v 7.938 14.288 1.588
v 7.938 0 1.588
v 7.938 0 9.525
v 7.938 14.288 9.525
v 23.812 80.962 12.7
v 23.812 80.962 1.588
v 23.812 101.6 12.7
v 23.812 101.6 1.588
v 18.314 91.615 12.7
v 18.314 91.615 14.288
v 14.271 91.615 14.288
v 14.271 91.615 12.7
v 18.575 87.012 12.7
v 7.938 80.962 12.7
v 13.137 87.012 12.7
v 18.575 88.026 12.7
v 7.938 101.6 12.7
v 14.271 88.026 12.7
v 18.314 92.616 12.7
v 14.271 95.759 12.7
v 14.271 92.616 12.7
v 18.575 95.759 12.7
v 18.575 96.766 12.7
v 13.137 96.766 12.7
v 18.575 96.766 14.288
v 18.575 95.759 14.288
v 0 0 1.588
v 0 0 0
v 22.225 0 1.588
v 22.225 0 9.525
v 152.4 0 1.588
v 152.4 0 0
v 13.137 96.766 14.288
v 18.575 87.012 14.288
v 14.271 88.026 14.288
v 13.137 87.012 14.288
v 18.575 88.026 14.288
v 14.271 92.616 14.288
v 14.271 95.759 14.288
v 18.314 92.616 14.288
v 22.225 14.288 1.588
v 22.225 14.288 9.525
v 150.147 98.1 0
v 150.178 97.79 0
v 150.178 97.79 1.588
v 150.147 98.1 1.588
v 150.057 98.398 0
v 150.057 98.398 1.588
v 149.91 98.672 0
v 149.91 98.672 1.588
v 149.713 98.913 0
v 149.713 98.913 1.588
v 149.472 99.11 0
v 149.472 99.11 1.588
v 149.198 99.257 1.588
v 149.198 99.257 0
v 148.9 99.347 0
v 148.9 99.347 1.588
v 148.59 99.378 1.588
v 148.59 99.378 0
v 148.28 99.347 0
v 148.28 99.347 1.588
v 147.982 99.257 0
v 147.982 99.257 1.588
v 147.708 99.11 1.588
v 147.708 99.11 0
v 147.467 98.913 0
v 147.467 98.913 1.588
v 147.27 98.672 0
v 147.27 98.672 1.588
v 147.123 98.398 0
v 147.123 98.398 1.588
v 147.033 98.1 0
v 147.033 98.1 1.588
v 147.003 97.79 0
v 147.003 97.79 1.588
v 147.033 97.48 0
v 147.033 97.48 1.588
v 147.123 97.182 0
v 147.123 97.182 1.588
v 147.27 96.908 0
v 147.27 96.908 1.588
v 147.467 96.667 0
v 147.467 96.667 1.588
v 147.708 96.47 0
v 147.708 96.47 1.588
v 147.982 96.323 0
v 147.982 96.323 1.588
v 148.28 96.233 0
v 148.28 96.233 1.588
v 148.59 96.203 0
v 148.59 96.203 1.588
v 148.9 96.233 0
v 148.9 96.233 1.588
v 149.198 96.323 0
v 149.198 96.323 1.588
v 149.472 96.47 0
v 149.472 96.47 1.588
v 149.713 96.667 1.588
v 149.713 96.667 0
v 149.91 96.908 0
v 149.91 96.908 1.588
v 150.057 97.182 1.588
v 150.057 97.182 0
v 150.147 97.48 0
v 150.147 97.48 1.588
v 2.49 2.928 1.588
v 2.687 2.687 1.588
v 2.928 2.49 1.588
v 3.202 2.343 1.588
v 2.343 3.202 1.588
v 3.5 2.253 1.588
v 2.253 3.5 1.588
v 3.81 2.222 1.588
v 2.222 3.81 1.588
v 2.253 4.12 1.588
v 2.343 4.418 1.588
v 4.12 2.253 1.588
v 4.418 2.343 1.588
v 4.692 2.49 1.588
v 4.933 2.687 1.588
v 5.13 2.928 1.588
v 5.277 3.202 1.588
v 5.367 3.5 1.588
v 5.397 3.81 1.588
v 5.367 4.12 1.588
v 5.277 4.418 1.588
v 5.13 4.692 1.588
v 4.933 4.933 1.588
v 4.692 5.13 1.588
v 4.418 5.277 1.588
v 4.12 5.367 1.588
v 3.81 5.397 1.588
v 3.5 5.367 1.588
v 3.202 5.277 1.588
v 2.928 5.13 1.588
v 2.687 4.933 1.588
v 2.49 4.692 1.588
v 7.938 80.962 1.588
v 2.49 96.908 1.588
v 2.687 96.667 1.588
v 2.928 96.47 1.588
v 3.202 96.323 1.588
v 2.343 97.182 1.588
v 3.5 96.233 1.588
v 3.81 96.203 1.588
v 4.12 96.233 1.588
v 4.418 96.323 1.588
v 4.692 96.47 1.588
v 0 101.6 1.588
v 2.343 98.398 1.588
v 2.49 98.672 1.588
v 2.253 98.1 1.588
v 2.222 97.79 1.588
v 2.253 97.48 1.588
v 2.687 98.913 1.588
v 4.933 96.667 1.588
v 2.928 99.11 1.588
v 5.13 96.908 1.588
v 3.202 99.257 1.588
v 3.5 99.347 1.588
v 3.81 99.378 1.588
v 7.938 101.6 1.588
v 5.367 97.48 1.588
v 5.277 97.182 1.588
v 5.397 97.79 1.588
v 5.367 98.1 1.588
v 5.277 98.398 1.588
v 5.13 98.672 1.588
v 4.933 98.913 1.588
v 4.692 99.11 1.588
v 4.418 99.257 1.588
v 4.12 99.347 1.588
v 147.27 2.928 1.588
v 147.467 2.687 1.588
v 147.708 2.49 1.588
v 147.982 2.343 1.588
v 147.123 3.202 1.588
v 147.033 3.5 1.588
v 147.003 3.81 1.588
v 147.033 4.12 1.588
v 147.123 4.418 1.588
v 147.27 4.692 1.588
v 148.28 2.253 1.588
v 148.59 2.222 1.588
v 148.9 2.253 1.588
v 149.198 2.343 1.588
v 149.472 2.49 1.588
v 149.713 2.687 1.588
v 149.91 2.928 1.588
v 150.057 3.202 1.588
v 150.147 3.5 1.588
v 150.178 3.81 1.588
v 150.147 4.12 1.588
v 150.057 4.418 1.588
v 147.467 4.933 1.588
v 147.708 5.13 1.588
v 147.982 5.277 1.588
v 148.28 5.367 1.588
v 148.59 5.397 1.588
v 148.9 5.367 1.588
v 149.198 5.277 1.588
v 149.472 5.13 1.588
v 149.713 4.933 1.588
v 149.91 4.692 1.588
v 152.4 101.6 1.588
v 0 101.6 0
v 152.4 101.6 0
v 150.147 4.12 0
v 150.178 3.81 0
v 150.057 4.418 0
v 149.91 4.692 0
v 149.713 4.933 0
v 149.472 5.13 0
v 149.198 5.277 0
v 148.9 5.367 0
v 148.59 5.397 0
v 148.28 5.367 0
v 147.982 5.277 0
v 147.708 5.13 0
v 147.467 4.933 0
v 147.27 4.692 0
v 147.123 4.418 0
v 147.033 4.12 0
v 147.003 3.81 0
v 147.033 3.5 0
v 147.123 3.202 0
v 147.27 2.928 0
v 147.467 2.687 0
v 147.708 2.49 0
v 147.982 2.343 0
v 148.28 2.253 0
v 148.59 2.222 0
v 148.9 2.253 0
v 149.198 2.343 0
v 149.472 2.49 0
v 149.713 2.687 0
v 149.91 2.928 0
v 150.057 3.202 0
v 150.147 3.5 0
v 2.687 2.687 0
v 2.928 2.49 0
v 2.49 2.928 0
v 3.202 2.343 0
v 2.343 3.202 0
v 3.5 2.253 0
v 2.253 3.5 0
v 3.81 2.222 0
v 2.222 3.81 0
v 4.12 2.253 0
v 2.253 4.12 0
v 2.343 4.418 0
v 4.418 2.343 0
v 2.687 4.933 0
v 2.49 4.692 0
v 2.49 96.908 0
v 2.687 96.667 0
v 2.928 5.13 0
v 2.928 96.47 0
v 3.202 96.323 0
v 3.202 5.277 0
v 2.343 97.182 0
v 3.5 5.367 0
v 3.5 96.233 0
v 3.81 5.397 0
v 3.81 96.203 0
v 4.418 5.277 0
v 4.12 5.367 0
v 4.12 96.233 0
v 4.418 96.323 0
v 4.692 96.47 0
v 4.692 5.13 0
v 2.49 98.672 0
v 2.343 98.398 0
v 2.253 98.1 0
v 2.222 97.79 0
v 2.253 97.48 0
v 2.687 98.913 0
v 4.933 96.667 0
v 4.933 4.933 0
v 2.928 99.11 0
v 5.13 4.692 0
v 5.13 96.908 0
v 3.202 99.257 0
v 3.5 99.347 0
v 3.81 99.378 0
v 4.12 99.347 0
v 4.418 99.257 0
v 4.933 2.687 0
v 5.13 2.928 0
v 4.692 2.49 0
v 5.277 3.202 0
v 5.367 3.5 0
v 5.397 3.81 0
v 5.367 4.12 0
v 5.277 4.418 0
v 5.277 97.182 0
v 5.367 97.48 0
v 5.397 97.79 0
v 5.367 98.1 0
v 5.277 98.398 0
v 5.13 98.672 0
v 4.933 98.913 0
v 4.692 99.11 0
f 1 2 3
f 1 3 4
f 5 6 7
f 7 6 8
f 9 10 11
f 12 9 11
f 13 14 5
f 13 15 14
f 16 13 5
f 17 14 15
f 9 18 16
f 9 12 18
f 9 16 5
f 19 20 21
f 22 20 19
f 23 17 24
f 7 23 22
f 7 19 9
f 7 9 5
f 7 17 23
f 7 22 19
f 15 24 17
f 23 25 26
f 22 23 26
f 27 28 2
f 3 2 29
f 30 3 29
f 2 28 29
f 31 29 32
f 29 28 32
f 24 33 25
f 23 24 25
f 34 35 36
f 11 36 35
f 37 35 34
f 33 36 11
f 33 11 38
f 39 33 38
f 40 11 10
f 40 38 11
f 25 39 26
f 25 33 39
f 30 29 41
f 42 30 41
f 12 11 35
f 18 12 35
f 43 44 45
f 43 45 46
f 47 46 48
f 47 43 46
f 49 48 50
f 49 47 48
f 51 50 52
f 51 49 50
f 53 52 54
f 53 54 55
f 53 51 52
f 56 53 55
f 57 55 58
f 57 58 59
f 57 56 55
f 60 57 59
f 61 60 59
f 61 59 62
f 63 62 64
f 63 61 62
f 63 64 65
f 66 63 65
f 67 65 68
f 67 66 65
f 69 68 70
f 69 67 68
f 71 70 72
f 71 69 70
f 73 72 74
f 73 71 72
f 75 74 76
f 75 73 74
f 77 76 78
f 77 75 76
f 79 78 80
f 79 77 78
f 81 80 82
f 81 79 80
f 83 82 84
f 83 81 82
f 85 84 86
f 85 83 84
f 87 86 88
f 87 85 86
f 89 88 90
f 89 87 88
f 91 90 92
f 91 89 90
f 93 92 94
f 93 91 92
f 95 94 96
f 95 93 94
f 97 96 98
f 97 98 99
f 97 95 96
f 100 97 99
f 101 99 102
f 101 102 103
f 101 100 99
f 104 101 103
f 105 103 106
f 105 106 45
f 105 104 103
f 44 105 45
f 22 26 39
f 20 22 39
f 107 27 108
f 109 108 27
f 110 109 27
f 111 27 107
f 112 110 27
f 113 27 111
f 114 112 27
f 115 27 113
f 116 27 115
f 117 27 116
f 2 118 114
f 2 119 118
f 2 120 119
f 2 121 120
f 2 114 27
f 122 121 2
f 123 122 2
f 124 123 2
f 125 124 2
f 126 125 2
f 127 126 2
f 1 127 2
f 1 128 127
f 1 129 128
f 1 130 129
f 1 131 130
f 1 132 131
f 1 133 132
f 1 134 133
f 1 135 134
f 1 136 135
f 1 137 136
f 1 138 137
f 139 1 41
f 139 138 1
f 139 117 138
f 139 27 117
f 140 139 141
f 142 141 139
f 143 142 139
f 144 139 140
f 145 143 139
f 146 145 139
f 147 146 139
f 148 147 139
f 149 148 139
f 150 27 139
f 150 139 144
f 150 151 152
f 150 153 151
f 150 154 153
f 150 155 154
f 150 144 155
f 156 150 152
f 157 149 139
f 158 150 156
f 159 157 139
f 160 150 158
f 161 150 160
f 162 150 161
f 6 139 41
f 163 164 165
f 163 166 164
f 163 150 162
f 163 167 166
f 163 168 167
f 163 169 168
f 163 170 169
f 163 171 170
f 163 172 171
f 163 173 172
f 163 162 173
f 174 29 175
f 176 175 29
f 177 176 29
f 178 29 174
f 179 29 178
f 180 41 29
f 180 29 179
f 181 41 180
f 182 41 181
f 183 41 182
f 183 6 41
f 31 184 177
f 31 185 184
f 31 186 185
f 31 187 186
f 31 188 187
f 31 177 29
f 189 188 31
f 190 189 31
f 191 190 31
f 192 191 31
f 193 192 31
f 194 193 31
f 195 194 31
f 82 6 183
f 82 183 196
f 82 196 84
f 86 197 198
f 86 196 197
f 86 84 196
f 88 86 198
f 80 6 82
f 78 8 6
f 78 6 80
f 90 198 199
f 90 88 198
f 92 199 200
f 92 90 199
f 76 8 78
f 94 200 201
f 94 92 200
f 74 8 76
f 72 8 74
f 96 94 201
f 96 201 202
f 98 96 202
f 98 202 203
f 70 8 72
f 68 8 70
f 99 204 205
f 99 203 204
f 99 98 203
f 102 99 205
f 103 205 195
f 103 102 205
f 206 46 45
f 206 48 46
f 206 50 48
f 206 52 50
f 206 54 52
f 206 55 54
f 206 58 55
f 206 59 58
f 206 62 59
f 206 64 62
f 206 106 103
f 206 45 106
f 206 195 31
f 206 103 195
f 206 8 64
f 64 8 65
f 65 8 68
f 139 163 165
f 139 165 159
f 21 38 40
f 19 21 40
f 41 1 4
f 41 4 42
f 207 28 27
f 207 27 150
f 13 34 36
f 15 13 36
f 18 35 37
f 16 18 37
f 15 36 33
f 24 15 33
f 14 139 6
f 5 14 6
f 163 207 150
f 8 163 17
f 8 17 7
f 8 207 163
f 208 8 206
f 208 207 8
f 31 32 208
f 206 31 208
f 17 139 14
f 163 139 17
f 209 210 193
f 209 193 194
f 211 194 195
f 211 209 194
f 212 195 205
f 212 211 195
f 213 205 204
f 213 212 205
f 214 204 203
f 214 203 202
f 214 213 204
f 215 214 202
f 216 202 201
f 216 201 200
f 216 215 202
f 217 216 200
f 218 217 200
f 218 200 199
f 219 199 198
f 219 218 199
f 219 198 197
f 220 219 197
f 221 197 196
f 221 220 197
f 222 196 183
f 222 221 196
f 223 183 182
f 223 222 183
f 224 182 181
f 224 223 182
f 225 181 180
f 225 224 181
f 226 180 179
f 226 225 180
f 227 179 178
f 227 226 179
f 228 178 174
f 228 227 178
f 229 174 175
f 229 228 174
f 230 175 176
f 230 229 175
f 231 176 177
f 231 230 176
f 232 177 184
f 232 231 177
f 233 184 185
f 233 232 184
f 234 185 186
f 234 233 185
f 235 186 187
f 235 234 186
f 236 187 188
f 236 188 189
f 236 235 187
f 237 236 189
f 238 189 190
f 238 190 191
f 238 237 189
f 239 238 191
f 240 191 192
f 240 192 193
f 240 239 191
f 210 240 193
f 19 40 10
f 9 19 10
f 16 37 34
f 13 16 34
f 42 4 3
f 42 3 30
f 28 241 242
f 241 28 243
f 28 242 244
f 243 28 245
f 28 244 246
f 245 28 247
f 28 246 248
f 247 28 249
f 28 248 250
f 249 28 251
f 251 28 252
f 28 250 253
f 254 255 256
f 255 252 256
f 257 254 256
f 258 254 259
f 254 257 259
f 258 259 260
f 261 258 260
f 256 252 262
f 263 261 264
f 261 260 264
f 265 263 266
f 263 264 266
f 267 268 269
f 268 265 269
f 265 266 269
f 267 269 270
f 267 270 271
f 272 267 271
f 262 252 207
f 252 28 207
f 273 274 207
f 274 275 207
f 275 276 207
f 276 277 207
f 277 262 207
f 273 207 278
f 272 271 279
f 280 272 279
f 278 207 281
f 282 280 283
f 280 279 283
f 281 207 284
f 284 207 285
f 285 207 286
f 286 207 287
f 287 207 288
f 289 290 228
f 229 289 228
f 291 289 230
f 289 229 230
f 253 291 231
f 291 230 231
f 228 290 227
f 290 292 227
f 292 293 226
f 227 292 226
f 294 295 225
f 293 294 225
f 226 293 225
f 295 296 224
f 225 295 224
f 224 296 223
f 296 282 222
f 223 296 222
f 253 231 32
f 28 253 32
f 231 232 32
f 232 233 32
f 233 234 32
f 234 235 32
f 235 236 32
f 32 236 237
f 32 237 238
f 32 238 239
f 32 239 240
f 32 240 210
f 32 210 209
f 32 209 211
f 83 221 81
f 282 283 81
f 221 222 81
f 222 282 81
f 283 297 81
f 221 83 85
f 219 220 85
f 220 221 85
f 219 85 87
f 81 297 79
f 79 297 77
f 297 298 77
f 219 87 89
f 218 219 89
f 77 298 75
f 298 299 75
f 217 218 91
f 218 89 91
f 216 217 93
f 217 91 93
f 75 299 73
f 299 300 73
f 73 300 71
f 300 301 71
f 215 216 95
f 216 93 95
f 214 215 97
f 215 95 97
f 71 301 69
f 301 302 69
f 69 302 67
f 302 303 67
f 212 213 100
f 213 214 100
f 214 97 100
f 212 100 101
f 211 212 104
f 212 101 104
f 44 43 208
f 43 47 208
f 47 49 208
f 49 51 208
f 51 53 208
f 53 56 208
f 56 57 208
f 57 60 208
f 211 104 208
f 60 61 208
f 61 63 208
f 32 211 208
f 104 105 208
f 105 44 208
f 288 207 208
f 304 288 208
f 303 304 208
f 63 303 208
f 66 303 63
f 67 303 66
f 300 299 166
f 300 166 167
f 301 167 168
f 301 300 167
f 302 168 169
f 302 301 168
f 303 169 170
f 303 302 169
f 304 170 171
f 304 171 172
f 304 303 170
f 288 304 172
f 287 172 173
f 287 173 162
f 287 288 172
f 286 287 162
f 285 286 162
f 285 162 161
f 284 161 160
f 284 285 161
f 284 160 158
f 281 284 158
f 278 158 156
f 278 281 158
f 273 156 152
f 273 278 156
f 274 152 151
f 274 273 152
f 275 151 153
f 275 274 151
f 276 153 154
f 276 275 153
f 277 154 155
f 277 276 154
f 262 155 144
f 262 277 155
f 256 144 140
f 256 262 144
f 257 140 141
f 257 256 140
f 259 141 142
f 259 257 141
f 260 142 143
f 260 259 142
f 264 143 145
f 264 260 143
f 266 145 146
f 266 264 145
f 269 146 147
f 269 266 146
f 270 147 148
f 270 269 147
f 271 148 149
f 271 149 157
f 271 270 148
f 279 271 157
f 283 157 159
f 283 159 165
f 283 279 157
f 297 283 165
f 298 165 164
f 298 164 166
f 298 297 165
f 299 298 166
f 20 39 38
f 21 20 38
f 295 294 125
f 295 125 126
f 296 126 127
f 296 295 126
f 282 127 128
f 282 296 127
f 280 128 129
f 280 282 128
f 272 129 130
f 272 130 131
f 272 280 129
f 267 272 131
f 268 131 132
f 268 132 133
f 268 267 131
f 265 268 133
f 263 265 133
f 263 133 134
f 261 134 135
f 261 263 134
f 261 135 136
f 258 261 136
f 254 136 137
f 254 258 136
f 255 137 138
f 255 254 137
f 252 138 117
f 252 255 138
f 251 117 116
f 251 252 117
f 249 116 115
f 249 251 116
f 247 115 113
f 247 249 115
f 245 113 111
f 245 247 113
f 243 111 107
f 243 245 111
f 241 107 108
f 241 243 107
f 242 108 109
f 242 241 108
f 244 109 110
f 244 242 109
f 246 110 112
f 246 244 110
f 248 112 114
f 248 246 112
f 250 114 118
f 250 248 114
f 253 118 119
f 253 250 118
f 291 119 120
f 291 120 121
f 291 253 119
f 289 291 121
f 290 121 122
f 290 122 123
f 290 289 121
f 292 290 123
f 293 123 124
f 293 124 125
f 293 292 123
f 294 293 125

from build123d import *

# Parameters (mm, degrees)
F0_W     = 152.4
F0_H     = 101.6
F0_R     = 1.5875
F1_DEPTH = 1.5875
F2_W     = 15.875
F2_H     = 20.6375
F3_DEPTH = 12.7
F4_W     = 14.2875
F4_H     = 14.288262
F5_DEPTH = 7.9375
F6_W     = 15.875
F6_H     = 20.6375
F7_DEPTH = 1.5875


with BuildPart() as f1:
    # F0 (on Top) → F1 (new body)
    with BuildSketch(Plane.XY):
        with Locations((76.2, 50.8)):
            Rectangle(F0_W, F0_H)
        with Locations((3.8099971771, 3.8099971771)):
            Circle(F0_R, mode=Mode.SUBTRACT)
        with Locations((148.5900028229, 3.8099971771)):
            Circle(F0_R, mode=Mode.SUBTRACT)
        with Locations((3.8099971771, 97.7900028229)):
            Circle(F0_R, mode=Mode.SUBTRACT)
        with Locations((148.5900028229, 97.7900028229)):
            Circle(F0_R, mode=Mode.SUBTRACT)
    extrude(amount=F1_DEPTH)

    # F2 (on face) → F3 (join)
    with BuildSketch(Plane.XY.offset(1.5875)):
        with Locations((15.875, 91.28125)):
            Rectangle(F2_W, F2_H)
    extrude(amount=F3_DEPTH)

    # F4 (on face) → F5 (join)
    with BuildSketch(Plane.XY.offset(1.5875)):
        with Locations((15.08125, 7.144131)):
            Rectangle(F4_W, F4_H)
    extrude(amount=F5_DEPTH)

    # F6 (on face) → F7 (cut)
    with BuildSketch(Plane.XY.offset(14.2875)):
        with Locations((15.875, 91.28125)):
            Rectangle(F6_W, F6_H)
        Polygon((18.5745110599, 88.026480759), (18.5745110599, 87.0124623179), (13.1372374405, 87.0124623179), (13.1372374405, 96.7662523326), (18.5745110599, 96.7662523326), (18.5745110599, 95.7586382186), (14.2708033187, 95.7586382186), (14.2708033187, 92.6162484393), (18.3140684288, 92.6162484393), (18.3140684288, 91.6150386523), (14.2708033187, 91.6150386523), (14.2708033187, 88.026480759), align=None, mode=Mode.SUBTRACT)
    extrude(amount=-F7_DEPTH, mode=Mode.SUBTRACT)


solid = f1.part
